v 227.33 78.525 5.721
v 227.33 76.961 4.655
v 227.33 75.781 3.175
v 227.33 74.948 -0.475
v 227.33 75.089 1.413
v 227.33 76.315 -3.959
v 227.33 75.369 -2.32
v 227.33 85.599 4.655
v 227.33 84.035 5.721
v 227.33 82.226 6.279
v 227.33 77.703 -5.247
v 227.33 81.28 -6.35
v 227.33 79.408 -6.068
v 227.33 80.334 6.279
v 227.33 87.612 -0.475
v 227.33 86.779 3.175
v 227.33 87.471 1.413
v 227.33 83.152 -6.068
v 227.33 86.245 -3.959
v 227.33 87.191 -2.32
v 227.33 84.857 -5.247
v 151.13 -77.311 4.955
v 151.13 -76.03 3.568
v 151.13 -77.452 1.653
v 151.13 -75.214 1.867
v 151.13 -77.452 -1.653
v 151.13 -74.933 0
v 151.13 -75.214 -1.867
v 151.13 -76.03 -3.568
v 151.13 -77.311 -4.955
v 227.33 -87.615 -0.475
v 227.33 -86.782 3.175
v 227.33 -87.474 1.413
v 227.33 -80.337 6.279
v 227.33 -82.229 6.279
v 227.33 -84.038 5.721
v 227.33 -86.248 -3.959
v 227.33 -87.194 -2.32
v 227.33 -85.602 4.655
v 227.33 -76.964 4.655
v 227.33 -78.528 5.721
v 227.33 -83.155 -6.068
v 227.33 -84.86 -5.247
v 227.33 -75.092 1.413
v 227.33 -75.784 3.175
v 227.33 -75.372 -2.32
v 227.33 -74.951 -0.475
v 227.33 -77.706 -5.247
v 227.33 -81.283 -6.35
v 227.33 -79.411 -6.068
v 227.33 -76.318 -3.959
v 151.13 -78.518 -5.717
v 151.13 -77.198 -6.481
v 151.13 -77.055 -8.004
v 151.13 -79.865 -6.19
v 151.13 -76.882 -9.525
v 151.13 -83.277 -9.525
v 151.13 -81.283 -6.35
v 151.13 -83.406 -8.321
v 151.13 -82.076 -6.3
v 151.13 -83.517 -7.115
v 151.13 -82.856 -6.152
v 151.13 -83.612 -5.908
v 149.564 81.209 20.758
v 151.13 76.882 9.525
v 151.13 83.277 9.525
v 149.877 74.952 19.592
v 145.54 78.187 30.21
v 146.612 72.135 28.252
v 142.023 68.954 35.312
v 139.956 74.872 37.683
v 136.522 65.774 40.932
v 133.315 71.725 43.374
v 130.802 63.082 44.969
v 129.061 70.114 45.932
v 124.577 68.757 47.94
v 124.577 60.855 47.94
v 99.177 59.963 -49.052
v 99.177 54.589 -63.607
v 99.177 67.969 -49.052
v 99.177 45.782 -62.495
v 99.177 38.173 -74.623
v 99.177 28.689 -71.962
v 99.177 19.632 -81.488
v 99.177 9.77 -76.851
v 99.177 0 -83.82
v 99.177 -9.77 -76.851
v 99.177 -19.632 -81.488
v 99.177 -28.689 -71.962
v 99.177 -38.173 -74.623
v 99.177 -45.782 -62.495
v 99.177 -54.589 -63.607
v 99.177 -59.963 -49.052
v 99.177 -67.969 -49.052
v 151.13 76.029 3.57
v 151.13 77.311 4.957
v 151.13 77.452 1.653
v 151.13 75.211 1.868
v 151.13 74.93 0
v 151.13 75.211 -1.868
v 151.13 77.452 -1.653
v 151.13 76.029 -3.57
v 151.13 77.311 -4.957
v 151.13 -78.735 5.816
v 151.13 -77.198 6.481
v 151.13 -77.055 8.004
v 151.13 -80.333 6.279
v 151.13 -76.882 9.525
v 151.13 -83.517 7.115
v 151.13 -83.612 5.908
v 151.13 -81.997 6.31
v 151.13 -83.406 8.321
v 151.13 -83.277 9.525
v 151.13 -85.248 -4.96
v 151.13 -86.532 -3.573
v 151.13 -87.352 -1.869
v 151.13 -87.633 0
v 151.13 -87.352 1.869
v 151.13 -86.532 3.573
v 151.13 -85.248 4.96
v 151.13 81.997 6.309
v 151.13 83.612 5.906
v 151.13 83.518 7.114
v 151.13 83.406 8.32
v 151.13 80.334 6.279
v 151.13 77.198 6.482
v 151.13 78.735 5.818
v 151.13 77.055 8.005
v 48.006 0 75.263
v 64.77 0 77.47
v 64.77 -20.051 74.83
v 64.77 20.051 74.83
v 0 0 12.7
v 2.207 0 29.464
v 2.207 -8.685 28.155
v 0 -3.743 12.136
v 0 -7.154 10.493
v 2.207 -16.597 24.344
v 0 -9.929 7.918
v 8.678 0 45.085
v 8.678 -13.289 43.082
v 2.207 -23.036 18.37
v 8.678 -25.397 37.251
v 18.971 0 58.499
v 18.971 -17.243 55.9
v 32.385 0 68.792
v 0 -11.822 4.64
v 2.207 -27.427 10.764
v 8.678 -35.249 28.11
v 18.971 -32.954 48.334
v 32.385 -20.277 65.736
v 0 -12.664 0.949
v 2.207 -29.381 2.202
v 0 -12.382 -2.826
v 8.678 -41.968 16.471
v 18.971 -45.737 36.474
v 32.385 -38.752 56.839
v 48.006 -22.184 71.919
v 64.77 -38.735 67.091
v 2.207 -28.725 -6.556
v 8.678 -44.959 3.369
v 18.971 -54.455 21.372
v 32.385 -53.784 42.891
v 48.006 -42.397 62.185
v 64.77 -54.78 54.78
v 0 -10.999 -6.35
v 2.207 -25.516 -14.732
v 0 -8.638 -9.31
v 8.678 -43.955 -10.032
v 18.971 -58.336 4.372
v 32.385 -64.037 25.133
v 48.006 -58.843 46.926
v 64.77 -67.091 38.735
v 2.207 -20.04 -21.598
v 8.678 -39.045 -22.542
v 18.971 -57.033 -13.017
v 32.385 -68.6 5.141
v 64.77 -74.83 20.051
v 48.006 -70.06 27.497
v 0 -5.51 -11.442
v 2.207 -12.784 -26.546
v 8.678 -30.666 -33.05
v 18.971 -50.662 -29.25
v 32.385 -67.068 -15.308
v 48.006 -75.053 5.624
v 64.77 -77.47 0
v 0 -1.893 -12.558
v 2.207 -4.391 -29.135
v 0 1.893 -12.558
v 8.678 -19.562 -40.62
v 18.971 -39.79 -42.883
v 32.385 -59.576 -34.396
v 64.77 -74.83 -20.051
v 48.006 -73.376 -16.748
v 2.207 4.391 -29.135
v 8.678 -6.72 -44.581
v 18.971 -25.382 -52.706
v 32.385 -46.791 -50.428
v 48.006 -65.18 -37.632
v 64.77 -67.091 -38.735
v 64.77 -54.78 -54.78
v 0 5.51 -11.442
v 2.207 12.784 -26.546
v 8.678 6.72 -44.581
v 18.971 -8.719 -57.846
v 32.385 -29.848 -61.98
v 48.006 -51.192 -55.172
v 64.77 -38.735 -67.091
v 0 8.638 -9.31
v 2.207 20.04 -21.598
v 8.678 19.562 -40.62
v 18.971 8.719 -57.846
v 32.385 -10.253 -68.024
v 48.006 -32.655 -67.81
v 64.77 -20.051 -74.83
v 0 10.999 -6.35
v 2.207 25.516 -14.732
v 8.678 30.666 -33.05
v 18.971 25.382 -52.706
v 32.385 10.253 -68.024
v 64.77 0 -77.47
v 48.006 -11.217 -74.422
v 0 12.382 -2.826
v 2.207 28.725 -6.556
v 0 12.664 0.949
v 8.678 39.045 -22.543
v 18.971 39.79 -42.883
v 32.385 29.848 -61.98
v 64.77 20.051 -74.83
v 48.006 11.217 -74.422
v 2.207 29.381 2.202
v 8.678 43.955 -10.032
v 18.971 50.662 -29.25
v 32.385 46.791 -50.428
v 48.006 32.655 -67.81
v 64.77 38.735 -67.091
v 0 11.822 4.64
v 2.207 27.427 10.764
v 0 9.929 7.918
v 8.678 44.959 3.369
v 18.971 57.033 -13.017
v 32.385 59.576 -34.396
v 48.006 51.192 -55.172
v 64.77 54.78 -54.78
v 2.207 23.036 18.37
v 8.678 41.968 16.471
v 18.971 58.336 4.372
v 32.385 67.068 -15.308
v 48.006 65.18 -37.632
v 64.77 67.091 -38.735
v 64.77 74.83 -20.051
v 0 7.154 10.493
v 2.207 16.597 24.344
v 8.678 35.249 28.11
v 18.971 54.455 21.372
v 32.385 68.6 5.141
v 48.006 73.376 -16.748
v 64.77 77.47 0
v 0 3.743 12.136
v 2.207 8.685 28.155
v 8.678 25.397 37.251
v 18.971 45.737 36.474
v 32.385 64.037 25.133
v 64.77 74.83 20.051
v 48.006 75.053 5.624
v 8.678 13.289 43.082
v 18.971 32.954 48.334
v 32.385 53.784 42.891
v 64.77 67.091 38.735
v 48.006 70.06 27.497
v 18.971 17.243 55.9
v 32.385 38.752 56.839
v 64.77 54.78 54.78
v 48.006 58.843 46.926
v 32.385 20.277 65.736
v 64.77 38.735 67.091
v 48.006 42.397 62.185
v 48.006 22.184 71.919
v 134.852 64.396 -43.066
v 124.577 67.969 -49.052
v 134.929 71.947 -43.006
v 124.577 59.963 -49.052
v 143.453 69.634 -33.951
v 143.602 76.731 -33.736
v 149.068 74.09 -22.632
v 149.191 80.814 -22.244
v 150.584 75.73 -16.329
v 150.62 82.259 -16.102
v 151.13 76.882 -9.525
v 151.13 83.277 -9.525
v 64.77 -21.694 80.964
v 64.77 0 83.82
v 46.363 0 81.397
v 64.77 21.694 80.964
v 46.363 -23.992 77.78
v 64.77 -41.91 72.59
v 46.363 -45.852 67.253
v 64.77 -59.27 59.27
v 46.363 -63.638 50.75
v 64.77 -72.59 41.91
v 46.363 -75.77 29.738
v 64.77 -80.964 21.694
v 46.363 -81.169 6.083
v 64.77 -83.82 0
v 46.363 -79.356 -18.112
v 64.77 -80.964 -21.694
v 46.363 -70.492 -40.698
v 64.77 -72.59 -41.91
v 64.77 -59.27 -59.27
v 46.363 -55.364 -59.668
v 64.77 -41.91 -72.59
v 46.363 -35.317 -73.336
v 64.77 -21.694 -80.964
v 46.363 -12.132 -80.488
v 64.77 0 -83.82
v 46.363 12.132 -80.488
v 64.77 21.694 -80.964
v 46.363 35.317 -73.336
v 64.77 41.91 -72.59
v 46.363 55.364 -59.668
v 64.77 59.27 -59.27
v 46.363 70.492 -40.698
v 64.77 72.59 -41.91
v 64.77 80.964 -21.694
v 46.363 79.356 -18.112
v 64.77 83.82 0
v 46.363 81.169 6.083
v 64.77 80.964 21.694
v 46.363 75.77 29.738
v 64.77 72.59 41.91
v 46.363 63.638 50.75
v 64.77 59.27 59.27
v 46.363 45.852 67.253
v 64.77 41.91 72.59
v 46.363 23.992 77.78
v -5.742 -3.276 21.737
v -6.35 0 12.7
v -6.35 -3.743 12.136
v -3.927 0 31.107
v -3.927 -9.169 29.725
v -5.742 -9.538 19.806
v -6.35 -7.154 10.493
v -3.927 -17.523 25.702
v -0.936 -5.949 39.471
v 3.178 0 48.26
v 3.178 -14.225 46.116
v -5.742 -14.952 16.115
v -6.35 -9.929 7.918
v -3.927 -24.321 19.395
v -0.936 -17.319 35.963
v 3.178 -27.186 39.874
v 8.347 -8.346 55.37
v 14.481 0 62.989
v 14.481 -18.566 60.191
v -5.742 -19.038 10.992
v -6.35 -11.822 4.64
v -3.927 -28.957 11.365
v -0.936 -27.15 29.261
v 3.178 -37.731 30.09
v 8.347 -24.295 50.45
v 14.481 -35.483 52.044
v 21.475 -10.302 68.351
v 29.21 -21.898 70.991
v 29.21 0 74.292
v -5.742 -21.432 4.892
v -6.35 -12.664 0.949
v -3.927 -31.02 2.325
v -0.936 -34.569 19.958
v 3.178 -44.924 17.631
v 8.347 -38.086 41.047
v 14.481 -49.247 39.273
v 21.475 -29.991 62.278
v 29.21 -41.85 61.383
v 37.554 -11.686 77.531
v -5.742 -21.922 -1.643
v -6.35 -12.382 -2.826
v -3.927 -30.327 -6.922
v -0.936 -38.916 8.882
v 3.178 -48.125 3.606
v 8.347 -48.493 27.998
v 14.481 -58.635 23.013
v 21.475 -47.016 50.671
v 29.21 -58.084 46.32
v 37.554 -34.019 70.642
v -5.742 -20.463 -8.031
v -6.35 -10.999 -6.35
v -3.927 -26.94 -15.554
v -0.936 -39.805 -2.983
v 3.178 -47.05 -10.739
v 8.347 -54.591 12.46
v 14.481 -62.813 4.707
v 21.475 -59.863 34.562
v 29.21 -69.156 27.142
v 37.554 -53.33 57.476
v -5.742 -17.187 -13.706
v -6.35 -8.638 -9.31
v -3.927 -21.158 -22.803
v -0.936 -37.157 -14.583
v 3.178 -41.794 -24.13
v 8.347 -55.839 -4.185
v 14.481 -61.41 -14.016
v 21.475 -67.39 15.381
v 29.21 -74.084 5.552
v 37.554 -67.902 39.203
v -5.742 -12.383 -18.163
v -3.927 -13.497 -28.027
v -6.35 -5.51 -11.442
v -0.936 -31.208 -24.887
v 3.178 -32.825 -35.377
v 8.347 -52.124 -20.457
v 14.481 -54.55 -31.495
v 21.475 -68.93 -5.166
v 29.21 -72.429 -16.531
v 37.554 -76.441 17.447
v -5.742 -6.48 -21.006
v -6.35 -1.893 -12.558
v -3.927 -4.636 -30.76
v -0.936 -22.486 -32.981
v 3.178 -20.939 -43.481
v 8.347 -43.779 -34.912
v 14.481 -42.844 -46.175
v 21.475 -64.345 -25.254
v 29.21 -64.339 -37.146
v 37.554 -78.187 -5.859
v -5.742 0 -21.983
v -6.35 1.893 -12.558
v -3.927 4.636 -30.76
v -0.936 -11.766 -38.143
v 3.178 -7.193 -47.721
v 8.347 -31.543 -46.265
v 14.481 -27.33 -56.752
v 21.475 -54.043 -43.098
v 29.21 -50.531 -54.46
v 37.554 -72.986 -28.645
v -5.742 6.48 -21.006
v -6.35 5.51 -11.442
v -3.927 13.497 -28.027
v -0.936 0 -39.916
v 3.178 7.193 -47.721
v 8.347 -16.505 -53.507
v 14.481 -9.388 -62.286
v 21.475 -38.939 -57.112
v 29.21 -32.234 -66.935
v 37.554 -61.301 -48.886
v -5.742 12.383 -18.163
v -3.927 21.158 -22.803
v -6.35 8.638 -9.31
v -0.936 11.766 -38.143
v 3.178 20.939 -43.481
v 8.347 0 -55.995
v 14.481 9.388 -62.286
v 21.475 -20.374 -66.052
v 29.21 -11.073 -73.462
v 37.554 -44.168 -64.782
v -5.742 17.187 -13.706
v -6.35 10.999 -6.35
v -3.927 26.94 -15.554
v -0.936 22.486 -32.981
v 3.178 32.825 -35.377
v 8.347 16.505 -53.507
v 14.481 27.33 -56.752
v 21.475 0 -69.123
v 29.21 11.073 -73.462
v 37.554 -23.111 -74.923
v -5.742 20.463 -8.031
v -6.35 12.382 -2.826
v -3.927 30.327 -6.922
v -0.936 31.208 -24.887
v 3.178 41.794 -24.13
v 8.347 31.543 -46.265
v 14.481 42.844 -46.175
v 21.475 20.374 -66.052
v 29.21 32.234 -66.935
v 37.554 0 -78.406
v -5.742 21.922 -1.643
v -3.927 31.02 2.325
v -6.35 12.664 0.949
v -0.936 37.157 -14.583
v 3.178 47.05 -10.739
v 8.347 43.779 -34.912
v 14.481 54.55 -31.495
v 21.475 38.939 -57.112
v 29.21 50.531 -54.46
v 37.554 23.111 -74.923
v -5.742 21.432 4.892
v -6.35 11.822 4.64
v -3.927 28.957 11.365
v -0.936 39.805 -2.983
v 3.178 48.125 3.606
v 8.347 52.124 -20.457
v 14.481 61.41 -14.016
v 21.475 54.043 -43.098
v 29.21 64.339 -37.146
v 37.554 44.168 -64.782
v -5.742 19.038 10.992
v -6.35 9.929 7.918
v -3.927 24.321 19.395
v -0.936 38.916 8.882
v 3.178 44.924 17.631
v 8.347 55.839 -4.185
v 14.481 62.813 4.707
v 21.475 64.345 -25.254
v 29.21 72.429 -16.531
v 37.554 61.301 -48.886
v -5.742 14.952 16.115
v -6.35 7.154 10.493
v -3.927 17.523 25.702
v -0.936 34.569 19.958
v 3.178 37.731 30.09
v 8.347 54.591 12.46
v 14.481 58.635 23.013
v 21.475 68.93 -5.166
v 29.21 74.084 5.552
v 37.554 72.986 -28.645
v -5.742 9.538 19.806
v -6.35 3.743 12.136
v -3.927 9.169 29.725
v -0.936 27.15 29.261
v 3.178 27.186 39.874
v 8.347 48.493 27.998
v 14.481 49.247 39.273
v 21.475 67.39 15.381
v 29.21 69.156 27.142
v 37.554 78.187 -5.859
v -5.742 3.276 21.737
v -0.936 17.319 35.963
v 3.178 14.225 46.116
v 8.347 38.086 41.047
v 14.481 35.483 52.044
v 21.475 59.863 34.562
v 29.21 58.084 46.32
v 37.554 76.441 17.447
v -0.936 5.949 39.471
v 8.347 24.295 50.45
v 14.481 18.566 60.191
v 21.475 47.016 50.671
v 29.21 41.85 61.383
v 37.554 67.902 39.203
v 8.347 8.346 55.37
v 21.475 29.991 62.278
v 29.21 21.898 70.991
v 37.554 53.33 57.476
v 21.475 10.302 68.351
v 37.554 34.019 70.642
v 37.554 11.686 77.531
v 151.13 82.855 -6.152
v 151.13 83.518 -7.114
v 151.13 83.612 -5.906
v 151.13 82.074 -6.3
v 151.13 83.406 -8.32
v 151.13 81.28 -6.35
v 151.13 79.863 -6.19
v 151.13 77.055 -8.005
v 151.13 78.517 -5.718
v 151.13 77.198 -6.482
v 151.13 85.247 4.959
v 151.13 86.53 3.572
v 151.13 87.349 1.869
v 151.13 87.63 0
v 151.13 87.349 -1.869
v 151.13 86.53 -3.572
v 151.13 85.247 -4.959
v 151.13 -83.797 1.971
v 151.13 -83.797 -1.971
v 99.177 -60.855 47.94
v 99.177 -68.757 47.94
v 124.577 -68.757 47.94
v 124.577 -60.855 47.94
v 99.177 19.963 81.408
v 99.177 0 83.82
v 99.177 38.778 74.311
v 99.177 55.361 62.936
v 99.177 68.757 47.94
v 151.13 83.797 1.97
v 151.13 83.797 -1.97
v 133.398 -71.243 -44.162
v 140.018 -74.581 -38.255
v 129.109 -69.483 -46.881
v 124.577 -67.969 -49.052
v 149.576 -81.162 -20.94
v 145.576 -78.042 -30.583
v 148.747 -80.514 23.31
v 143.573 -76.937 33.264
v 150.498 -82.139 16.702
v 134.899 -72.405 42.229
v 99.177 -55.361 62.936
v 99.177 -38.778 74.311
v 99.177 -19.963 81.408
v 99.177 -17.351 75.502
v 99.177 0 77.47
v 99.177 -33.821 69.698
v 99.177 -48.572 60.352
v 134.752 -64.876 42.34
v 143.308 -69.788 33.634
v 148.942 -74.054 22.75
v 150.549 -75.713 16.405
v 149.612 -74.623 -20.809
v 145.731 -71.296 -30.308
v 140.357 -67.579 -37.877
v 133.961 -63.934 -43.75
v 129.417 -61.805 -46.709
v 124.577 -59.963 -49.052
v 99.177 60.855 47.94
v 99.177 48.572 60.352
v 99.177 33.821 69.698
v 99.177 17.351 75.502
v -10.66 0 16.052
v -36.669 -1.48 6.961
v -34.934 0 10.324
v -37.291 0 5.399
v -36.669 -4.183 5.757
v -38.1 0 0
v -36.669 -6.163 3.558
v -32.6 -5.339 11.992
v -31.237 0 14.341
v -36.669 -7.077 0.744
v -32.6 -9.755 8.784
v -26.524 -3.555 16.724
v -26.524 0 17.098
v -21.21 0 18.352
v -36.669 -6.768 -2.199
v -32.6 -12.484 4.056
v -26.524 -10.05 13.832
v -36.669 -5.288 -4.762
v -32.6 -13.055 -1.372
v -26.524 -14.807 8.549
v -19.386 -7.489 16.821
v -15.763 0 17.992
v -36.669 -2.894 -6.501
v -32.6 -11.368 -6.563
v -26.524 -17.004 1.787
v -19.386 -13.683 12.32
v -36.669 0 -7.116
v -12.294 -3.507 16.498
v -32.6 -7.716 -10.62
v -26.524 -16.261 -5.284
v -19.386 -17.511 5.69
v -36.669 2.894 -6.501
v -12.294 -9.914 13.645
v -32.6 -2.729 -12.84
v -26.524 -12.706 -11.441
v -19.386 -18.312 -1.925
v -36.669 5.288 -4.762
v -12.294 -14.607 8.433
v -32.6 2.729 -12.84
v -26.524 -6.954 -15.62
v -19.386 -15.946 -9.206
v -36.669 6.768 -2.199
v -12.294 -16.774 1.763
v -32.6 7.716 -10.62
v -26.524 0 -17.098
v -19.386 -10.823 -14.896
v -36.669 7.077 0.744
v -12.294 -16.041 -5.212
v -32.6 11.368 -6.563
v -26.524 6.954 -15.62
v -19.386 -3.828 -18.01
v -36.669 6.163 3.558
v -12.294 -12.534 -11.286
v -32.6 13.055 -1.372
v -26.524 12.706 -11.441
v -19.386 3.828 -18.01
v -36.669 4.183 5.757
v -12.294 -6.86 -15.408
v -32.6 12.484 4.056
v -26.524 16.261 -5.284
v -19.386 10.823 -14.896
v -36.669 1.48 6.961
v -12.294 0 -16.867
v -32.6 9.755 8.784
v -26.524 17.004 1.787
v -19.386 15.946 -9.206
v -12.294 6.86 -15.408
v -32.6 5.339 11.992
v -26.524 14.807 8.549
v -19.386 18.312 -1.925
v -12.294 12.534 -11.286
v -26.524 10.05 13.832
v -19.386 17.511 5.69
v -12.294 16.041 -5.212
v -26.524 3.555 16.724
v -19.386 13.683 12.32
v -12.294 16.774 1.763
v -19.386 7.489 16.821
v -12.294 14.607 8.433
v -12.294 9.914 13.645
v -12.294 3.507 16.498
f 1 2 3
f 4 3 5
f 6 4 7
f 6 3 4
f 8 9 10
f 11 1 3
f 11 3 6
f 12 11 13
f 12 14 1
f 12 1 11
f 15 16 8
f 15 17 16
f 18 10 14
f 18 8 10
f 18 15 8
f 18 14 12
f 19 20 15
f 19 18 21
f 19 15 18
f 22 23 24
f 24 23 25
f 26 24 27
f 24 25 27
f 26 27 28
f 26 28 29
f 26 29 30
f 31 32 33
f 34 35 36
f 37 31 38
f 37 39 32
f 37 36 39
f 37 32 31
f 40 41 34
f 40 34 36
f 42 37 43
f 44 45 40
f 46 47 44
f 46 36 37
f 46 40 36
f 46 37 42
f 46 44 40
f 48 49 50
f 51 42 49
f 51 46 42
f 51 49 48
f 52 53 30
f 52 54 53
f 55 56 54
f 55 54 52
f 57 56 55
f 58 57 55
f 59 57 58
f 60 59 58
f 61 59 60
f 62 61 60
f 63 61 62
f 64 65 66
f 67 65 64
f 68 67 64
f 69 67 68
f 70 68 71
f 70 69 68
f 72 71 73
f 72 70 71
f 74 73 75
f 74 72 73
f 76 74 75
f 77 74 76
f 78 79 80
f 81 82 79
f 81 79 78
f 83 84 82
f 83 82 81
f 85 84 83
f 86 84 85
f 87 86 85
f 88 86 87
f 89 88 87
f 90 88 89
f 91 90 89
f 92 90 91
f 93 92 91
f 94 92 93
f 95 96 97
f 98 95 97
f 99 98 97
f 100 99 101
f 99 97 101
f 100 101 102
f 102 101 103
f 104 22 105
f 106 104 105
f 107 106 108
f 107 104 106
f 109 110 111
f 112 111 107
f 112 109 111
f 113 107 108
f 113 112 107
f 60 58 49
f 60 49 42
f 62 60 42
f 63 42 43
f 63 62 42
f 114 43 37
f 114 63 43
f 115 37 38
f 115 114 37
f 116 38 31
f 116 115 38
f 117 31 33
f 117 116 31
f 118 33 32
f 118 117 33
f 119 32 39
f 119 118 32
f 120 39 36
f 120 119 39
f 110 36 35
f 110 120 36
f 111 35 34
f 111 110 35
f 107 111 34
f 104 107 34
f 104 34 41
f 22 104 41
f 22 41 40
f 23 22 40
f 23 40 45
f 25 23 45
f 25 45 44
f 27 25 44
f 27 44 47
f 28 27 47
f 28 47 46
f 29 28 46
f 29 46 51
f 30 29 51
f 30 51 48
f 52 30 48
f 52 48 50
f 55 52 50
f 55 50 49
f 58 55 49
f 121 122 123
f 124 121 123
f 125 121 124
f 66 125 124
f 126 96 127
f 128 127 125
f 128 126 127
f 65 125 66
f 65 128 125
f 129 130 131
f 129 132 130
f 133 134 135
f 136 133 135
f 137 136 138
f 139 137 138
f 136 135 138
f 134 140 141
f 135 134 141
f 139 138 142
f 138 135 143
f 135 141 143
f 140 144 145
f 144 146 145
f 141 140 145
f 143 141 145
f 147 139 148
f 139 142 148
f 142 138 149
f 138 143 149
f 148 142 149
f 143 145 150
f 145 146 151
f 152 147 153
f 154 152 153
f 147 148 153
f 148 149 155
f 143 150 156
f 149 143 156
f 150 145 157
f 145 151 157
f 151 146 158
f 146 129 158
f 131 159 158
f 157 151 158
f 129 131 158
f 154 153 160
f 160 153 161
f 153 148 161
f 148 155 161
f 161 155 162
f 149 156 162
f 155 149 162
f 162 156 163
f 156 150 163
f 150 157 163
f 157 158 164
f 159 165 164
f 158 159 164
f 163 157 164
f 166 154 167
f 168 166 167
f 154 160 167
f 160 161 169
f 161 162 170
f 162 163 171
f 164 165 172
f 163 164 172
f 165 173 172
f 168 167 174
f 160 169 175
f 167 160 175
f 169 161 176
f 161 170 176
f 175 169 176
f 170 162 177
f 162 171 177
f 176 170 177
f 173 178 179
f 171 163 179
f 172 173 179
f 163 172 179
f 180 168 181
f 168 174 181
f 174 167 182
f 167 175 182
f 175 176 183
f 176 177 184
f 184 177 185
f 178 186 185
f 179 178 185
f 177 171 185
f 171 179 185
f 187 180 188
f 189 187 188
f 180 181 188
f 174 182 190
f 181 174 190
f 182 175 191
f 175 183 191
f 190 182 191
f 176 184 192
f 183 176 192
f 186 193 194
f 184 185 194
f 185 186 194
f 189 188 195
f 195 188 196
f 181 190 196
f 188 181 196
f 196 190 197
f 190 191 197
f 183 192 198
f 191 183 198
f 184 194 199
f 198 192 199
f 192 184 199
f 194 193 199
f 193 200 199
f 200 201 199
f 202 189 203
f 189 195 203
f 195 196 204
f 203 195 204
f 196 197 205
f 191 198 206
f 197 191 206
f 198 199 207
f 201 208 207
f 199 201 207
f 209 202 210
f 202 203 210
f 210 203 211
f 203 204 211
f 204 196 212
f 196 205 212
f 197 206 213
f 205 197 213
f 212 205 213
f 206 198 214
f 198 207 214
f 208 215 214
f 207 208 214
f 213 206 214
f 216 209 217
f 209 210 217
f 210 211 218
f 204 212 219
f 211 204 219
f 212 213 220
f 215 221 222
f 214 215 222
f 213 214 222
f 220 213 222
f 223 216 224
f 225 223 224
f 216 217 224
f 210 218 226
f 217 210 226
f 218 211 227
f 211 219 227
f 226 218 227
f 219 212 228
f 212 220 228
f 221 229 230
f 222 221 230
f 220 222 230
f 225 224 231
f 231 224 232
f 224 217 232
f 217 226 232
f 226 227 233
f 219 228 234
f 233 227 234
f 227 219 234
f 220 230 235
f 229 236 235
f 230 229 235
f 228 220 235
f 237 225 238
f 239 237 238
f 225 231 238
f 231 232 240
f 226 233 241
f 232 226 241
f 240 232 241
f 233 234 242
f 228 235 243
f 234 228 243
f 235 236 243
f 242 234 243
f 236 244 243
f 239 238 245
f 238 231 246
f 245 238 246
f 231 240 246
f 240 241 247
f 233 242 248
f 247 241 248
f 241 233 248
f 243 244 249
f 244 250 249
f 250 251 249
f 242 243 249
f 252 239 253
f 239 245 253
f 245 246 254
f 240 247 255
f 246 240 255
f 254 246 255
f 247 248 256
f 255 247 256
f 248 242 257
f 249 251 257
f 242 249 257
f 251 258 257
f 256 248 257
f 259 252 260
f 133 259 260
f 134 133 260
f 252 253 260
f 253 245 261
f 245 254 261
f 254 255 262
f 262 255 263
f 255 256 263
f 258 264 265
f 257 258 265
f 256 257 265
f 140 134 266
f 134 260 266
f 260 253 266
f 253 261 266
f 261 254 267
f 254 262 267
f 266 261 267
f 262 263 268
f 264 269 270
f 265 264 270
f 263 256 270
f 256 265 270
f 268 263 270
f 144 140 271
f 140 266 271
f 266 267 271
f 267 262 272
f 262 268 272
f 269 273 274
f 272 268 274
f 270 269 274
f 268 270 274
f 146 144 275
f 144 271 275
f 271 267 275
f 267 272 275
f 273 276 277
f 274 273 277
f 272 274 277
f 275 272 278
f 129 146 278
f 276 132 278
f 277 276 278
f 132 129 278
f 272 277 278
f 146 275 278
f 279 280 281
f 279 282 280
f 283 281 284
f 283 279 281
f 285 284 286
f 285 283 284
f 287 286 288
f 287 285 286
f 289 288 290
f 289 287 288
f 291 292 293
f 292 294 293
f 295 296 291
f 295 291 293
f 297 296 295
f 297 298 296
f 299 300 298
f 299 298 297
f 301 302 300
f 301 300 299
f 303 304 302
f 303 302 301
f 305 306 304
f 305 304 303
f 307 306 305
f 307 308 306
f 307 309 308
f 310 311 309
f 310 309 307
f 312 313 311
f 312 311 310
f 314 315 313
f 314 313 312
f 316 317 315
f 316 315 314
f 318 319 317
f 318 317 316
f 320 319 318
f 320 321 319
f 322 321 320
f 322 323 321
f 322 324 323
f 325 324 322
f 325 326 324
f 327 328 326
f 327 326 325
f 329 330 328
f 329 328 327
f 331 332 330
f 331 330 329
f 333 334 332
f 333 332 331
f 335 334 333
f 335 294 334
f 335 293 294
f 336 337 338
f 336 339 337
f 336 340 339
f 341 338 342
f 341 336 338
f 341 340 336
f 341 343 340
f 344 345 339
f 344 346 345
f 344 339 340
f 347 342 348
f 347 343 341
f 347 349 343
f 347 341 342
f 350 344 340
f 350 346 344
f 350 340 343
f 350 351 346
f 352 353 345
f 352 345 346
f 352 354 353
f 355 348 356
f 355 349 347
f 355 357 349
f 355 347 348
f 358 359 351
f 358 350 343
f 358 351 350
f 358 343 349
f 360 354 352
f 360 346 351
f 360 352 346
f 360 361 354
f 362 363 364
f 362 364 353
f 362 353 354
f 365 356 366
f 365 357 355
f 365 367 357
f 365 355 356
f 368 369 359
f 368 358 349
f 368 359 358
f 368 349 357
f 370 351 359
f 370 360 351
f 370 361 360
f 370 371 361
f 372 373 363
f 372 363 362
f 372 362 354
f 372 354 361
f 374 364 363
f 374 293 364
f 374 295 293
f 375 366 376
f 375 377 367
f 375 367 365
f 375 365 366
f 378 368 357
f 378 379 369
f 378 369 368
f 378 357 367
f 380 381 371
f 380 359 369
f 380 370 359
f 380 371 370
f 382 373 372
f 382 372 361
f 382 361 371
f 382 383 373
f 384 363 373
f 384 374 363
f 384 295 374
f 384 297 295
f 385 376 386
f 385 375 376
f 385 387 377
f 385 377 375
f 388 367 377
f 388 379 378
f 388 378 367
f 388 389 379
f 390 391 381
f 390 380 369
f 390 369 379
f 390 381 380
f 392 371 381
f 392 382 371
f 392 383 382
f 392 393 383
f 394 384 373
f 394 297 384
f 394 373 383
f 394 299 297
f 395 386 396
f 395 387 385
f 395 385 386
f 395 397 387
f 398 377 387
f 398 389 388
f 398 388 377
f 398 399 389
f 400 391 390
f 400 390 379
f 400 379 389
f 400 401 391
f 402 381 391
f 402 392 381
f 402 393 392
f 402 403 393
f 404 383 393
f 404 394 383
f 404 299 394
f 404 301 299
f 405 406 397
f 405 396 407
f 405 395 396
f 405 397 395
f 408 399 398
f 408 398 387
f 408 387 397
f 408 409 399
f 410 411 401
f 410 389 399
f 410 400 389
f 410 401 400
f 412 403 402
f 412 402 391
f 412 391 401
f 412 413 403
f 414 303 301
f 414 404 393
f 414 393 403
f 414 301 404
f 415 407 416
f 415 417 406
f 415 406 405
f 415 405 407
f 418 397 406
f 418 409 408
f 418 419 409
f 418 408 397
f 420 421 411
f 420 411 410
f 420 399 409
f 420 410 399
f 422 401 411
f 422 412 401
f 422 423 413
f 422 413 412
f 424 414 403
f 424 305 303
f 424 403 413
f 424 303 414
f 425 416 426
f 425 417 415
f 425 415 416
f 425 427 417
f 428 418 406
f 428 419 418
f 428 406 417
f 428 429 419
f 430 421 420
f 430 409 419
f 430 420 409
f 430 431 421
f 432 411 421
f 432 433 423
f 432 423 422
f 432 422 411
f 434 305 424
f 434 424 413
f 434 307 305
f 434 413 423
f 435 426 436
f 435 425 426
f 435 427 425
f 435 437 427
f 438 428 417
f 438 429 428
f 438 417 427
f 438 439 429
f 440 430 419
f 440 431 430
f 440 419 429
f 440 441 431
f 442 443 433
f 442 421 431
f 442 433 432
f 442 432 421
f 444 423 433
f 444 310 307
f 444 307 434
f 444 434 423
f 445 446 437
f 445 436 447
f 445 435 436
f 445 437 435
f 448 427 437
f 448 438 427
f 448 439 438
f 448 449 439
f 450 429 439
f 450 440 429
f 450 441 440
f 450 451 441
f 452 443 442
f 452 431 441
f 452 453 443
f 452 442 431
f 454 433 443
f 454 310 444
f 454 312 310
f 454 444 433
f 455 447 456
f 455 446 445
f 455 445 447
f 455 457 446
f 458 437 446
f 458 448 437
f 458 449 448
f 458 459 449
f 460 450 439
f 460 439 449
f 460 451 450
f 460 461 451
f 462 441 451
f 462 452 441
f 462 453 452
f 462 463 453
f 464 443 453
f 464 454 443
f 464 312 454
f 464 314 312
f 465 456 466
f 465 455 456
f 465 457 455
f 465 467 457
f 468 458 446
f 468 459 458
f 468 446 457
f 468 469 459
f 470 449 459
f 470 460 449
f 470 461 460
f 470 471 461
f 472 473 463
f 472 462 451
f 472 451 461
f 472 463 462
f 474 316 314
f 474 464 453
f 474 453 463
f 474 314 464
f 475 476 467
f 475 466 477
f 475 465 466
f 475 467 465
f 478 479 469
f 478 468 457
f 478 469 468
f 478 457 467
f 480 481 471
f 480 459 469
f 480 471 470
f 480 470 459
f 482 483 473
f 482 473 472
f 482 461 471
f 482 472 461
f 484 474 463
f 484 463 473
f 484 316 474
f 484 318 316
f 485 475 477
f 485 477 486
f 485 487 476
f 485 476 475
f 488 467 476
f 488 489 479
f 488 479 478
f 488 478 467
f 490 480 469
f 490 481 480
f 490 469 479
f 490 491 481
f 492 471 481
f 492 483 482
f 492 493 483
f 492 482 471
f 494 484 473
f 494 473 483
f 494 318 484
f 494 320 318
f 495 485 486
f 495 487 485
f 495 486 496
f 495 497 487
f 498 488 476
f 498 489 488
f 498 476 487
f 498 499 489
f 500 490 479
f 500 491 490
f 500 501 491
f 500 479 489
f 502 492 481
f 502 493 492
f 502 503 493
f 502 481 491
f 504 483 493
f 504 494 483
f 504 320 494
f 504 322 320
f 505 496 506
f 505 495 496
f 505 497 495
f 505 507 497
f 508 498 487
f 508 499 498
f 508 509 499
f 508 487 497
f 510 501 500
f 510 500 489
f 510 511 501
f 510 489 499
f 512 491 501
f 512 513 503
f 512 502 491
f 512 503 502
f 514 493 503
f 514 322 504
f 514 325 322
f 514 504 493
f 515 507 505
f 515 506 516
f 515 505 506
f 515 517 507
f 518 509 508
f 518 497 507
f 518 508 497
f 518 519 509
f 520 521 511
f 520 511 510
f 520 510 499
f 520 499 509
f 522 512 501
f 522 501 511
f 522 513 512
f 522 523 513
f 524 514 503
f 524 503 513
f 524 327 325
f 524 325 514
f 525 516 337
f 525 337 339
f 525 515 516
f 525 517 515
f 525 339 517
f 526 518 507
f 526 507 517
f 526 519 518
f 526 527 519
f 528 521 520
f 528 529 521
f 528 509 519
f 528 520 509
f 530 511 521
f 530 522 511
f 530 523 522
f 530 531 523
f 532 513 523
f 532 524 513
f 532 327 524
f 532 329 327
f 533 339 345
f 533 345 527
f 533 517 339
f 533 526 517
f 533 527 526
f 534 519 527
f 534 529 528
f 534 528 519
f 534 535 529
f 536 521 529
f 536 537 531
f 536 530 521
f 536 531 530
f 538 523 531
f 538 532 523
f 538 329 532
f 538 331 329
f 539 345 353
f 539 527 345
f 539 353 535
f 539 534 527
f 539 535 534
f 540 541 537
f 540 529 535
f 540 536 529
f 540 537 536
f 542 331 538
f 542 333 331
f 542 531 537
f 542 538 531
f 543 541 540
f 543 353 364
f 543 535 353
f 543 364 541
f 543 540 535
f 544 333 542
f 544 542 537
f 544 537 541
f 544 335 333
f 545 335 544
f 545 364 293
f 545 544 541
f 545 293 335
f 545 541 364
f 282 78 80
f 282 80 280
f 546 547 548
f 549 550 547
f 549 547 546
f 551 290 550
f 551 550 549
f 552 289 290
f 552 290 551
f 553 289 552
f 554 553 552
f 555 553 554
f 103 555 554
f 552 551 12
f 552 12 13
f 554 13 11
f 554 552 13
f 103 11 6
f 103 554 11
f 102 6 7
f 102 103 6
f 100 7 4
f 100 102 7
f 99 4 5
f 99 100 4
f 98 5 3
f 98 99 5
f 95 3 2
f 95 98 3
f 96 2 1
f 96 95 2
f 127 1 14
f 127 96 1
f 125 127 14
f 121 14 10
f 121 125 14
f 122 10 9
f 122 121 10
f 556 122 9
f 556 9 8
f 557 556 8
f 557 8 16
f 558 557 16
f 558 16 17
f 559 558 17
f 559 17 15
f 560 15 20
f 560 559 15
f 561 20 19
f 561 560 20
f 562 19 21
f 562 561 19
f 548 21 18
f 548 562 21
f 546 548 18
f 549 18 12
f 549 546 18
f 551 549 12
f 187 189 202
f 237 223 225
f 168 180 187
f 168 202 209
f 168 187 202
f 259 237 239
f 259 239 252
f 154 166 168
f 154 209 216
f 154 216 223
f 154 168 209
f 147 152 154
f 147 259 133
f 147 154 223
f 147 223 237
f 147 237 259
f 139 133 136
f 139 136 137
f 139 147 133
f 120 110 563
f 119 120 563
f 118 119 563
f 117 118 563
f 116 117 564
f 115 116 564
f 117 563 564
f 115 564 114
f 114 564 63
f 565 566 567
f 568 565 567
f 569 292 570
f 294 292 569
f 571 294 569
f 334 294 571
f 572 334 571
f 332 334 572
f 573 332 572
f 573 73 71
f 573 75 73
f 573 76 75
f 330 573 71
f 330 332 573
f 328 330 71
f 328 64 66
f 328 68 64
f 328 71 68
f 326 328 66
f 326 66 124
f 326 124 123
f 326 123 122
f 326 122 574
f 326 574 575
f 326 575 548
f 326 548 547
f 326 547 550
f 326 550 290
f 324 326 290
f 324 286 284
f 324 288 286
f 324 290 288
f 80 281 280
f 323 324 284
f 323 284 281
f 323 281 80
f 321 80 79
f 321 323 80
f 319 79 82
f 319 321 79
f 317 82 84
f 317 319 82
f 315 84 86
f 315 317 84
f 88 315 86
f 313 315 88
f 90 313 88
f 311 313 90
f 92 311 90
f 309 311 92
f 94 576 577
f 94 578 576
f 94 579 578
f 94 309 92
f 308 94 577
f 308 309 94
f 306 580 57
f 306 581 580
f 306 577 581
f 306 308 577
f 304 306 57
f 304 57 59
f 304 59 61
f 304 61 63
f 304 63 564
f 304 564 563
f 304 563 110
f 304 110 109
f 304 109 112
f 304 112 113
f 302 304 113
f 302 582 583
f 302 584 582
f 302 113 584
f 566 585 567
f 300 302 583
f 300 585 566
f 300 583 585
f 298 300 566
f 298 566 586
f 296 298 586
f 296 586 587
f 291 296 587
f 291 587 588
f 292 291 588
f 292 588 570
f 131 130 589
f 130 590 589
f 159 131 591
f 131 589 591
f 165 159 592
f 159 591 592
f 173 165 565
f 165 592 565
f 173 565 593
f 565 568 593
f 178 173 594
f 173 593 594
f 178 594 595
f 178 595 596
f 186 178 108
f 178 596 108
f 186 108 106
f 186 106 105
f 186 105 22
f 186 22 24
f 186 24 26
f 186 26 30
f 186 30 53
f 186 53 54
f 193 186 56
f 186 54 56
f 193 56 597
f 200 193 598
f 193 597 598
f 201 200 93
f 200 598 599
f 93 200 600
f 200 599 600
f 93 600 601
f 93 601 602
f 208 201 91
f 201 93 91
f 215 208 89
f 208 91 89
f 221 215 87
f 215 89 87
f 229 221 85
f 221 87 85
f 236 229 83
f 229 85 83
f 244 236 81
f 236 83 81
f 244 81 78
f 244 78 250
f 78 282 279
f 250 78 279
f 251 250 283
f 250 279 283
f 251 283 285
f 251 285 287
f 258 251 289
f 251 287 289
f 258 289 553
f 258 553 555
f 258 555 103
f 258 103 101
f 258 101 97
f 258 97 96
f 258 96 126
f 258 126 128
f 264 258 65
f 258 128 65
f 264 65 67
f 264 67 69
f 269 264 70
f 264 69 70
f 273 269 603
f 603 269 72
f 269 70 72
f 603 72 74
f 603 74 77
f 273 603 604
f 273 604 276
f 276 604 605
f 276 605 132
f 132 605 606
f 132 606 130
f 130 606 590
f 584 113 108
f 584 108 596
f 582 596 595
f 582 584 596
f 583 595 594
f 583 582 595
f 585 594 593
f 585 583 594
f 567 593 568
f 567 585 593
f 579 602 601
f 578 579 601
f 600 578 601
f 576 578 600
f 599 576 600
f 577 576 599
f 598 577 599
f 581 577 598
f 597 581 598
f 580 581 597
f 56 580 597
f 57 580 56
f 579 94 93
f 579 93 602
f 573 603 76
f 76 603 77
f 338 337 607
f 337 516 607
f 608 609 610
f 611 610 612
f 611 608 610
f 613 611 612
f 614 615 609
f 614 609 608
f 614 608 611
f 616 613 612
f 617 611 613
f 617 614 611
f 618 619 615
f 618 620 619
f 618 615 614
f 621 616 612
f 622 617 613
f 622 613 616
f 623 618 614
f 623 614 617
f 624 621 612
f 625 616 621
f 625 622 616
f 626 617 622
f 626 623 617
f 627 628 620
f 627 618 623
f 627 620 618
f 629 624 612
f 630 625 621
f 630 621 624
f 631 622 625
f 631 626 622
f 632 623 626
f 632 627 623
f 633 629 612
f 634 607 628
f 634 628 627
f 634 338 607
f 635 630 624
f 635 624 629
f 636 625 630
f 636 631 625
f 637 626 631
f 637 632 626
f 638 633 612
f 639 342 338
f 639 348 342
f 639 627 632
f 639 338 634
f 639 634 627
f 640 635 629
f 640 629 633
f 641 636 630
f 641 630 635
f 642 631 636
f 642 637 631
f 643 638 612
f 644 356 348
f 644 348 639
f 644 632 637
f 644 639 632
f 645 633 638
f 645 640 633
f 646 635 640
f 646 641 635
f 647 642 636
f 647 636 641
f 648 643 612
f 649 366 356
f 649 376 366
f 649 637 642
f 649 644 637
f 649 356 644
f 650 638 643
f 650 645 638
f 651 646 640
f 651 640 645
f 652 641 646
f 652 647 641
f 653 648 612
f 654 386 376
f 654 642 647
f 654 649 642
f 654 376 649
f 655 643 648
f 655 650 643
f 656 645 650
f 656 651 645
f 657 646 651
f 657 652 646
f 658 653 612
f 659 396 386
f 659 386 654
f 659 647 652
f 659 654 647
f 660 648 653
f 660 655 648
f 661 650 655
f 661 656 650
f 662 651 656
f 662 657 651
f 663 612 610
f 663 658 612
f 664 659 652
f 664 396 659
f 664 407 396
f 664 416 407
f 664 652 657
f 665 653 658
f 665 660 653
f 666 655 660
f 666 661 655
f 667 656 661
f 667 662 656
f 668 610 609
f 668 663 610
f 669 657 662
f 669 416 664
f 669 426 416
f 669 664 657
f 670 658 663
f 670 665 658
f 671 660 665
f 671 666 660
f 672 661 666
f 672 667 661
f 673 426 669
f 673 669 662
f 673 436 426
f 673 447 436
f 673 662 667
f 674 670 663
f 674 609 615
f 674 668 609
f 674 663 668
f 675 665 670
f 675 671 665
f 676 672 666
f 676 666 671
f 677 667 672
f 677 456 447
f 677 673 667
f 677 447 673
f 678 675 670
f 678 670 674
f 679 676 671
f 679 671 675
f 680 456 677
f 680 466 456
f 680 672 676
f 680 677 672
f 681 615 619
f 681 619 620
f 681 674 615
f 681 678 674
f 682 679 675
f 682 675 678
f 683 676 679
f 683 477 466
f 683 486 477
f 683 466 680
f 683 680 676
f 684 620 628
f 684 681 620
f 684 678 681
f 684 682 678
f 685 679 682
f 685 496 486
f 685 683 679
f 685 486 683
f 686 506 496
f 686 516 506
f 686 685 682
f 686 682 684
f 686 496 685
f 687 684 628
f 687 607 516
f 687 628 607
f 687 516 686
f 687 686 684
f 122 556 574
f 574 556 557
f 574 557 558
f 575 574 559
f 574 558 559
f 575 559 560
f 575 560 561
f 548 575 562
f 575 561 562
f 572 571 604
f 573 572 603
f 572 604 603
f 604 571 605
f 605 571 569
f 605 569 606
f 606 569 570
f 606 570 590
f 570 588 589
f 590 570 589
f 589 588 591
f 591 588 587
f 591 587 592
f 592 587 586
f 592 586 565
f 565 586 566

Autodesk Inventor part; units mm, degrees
ref_plane "YZ Plane" through (0, 0, 0) normal (1, 0, 0) x (0, 1, 0)
ref_plane "XZ Plane" through (0, 0, 0) normal (0, 1, 0) x (-1, 0, 0)
ref_plane "XY Plane" through (0, 0, 0) normal (0, 0, 1) x (1, 0, 0)
sketch "Sketch1" plane through (0, 0, 0) normal (0, 1, 0) x (-1, 0, 0)
  line L0 (0, 0) -> (0, 12.7)
  arc A0 (0, 12.7) -> (-64.77, 77.47) centre (-64.77, 12.7) ccw
  line L1 (0, 0) -> (38.1, 0)
  line L2 (-64.77, 77.47) -> (-152.4, 77.47)
  line L3 (-152.4, 77.47) -> (-152.4, 83.82)
  line L4 (-152.4, 83.82) -> (-64.77, 83.82)
  arc A1 (6.35, 12.7) -> (-64.77, 83.82) centre (-64.77, 12.7) ccw
  arc A2 (38.1, 0) -> (6.35, 12.7) centre (19.685, 0) ccw
  line L5 (81.359, 0) -> (-191.3598, 0) projected
  dimension "d0" = 12.7
  dimension "d4" = 152.4
  dimension "d5" = 77.47
  dimension "d6" = 6.35
  dimension "d7" = 12.7
  dimension "d9" = 38.1
revolve "Revolution1" add sketch "Sketch1" angle 360 about axis through (-10, 0, 0) along (1, 0, 0)
sketch "Sketch3" plane through (0, 0, 0) normal (0, 1, 0) x (-1, 0, 0)
  line L0 (-99.1769, -83.82) -> (-99.1769, -49.0516)
  line L1 (-99.1769, 83.82) -> (-99.1769, 47.9401)
  line L2 (-152.4, -83.82) -> (-152.4, 83.82)
  line L3 (-99.1769, -49.0516) -> (-124.5769, -49.0516)
  line L4 (-99.1769, 47.9401) -> (-124.5769, 47.9401)
  line L5 (-152.4, -83.82) -> (-64.77, -83.82) projected
  line L6 (-152.4, 83.82) -> (-64.77, 83.82) projected
  line L7 (-99.1769, -83.82) -> (-152.4, -83.82)
  line L8 (-152.4, 83.82) -> (-99.1769, 83.82)
  line L9 (-152.4, -83.82) -> (-152.4, 83.82)
  line L10 (-151.13, -9.525) -> (-151.13, 9.525)
  line L11 (76.2, 0) -> (-190.5, 0) projected
  arc A0 (-151.13, -9.525) -> (-124.5769, -49.0516) centre (-108.4341, -9.525) ccw
  arc A1 (-124.5769, 47.9401) -> (-151.13, 9.525) centre (-110.0654, 9.525) ccw
  point P0 (0, 0)
  point P1 (-152.4, 0)
  point P2 (-151.13, 0)
  dimension "d14" = 25.4
  dimension "d15" = 25.4
  dimension "d18" = 34.7684
  dimension "d22" = 53.2231
  dimension "d23" = 35.8799
  dimension "d26" = 19.05
  dimension "d27" = 1.27
extrude "Extrusion1" cut sketch "Sketch3" along normal through all both and the other way through all
sketch "Sketch4" plane through (151.13, -83.277, -9.525) normal (1, 0, 0) x (0, 0, -1)
  arc A0 (-19.05, 6.3948) -> (0, 6.3948) centre (-9.525, 83.277) ccw projected
  arc A1 (-19.05, 0) -> (0, 0) centre (-9.525, 83.277) ccw projected
  circle A2 centre (-9.525, 1.994) radius 6.35
  arc A3 (0, 160.1593) -> (-19.05, 160.1593) centre (-9.525, 83.277) ccw projected
  arc A4 (0, 166.5541) -> (-19.05, 166.5541) centre (-9.525, 83.277) ccw projected
  circle A5 centre (-9.525, 164.557) radius 6.35
  point P0 (-9.525, 160.747)
  dimension "d28" = 12.7
  dimension "d30" = 81.2831
  dimension "d31" = 12.7
  dimension "d32" = 81.28
extrude "Extrusion2" add sketch "Sketch4" along normal blind 76.2
properties part number "DMJ_hat"
